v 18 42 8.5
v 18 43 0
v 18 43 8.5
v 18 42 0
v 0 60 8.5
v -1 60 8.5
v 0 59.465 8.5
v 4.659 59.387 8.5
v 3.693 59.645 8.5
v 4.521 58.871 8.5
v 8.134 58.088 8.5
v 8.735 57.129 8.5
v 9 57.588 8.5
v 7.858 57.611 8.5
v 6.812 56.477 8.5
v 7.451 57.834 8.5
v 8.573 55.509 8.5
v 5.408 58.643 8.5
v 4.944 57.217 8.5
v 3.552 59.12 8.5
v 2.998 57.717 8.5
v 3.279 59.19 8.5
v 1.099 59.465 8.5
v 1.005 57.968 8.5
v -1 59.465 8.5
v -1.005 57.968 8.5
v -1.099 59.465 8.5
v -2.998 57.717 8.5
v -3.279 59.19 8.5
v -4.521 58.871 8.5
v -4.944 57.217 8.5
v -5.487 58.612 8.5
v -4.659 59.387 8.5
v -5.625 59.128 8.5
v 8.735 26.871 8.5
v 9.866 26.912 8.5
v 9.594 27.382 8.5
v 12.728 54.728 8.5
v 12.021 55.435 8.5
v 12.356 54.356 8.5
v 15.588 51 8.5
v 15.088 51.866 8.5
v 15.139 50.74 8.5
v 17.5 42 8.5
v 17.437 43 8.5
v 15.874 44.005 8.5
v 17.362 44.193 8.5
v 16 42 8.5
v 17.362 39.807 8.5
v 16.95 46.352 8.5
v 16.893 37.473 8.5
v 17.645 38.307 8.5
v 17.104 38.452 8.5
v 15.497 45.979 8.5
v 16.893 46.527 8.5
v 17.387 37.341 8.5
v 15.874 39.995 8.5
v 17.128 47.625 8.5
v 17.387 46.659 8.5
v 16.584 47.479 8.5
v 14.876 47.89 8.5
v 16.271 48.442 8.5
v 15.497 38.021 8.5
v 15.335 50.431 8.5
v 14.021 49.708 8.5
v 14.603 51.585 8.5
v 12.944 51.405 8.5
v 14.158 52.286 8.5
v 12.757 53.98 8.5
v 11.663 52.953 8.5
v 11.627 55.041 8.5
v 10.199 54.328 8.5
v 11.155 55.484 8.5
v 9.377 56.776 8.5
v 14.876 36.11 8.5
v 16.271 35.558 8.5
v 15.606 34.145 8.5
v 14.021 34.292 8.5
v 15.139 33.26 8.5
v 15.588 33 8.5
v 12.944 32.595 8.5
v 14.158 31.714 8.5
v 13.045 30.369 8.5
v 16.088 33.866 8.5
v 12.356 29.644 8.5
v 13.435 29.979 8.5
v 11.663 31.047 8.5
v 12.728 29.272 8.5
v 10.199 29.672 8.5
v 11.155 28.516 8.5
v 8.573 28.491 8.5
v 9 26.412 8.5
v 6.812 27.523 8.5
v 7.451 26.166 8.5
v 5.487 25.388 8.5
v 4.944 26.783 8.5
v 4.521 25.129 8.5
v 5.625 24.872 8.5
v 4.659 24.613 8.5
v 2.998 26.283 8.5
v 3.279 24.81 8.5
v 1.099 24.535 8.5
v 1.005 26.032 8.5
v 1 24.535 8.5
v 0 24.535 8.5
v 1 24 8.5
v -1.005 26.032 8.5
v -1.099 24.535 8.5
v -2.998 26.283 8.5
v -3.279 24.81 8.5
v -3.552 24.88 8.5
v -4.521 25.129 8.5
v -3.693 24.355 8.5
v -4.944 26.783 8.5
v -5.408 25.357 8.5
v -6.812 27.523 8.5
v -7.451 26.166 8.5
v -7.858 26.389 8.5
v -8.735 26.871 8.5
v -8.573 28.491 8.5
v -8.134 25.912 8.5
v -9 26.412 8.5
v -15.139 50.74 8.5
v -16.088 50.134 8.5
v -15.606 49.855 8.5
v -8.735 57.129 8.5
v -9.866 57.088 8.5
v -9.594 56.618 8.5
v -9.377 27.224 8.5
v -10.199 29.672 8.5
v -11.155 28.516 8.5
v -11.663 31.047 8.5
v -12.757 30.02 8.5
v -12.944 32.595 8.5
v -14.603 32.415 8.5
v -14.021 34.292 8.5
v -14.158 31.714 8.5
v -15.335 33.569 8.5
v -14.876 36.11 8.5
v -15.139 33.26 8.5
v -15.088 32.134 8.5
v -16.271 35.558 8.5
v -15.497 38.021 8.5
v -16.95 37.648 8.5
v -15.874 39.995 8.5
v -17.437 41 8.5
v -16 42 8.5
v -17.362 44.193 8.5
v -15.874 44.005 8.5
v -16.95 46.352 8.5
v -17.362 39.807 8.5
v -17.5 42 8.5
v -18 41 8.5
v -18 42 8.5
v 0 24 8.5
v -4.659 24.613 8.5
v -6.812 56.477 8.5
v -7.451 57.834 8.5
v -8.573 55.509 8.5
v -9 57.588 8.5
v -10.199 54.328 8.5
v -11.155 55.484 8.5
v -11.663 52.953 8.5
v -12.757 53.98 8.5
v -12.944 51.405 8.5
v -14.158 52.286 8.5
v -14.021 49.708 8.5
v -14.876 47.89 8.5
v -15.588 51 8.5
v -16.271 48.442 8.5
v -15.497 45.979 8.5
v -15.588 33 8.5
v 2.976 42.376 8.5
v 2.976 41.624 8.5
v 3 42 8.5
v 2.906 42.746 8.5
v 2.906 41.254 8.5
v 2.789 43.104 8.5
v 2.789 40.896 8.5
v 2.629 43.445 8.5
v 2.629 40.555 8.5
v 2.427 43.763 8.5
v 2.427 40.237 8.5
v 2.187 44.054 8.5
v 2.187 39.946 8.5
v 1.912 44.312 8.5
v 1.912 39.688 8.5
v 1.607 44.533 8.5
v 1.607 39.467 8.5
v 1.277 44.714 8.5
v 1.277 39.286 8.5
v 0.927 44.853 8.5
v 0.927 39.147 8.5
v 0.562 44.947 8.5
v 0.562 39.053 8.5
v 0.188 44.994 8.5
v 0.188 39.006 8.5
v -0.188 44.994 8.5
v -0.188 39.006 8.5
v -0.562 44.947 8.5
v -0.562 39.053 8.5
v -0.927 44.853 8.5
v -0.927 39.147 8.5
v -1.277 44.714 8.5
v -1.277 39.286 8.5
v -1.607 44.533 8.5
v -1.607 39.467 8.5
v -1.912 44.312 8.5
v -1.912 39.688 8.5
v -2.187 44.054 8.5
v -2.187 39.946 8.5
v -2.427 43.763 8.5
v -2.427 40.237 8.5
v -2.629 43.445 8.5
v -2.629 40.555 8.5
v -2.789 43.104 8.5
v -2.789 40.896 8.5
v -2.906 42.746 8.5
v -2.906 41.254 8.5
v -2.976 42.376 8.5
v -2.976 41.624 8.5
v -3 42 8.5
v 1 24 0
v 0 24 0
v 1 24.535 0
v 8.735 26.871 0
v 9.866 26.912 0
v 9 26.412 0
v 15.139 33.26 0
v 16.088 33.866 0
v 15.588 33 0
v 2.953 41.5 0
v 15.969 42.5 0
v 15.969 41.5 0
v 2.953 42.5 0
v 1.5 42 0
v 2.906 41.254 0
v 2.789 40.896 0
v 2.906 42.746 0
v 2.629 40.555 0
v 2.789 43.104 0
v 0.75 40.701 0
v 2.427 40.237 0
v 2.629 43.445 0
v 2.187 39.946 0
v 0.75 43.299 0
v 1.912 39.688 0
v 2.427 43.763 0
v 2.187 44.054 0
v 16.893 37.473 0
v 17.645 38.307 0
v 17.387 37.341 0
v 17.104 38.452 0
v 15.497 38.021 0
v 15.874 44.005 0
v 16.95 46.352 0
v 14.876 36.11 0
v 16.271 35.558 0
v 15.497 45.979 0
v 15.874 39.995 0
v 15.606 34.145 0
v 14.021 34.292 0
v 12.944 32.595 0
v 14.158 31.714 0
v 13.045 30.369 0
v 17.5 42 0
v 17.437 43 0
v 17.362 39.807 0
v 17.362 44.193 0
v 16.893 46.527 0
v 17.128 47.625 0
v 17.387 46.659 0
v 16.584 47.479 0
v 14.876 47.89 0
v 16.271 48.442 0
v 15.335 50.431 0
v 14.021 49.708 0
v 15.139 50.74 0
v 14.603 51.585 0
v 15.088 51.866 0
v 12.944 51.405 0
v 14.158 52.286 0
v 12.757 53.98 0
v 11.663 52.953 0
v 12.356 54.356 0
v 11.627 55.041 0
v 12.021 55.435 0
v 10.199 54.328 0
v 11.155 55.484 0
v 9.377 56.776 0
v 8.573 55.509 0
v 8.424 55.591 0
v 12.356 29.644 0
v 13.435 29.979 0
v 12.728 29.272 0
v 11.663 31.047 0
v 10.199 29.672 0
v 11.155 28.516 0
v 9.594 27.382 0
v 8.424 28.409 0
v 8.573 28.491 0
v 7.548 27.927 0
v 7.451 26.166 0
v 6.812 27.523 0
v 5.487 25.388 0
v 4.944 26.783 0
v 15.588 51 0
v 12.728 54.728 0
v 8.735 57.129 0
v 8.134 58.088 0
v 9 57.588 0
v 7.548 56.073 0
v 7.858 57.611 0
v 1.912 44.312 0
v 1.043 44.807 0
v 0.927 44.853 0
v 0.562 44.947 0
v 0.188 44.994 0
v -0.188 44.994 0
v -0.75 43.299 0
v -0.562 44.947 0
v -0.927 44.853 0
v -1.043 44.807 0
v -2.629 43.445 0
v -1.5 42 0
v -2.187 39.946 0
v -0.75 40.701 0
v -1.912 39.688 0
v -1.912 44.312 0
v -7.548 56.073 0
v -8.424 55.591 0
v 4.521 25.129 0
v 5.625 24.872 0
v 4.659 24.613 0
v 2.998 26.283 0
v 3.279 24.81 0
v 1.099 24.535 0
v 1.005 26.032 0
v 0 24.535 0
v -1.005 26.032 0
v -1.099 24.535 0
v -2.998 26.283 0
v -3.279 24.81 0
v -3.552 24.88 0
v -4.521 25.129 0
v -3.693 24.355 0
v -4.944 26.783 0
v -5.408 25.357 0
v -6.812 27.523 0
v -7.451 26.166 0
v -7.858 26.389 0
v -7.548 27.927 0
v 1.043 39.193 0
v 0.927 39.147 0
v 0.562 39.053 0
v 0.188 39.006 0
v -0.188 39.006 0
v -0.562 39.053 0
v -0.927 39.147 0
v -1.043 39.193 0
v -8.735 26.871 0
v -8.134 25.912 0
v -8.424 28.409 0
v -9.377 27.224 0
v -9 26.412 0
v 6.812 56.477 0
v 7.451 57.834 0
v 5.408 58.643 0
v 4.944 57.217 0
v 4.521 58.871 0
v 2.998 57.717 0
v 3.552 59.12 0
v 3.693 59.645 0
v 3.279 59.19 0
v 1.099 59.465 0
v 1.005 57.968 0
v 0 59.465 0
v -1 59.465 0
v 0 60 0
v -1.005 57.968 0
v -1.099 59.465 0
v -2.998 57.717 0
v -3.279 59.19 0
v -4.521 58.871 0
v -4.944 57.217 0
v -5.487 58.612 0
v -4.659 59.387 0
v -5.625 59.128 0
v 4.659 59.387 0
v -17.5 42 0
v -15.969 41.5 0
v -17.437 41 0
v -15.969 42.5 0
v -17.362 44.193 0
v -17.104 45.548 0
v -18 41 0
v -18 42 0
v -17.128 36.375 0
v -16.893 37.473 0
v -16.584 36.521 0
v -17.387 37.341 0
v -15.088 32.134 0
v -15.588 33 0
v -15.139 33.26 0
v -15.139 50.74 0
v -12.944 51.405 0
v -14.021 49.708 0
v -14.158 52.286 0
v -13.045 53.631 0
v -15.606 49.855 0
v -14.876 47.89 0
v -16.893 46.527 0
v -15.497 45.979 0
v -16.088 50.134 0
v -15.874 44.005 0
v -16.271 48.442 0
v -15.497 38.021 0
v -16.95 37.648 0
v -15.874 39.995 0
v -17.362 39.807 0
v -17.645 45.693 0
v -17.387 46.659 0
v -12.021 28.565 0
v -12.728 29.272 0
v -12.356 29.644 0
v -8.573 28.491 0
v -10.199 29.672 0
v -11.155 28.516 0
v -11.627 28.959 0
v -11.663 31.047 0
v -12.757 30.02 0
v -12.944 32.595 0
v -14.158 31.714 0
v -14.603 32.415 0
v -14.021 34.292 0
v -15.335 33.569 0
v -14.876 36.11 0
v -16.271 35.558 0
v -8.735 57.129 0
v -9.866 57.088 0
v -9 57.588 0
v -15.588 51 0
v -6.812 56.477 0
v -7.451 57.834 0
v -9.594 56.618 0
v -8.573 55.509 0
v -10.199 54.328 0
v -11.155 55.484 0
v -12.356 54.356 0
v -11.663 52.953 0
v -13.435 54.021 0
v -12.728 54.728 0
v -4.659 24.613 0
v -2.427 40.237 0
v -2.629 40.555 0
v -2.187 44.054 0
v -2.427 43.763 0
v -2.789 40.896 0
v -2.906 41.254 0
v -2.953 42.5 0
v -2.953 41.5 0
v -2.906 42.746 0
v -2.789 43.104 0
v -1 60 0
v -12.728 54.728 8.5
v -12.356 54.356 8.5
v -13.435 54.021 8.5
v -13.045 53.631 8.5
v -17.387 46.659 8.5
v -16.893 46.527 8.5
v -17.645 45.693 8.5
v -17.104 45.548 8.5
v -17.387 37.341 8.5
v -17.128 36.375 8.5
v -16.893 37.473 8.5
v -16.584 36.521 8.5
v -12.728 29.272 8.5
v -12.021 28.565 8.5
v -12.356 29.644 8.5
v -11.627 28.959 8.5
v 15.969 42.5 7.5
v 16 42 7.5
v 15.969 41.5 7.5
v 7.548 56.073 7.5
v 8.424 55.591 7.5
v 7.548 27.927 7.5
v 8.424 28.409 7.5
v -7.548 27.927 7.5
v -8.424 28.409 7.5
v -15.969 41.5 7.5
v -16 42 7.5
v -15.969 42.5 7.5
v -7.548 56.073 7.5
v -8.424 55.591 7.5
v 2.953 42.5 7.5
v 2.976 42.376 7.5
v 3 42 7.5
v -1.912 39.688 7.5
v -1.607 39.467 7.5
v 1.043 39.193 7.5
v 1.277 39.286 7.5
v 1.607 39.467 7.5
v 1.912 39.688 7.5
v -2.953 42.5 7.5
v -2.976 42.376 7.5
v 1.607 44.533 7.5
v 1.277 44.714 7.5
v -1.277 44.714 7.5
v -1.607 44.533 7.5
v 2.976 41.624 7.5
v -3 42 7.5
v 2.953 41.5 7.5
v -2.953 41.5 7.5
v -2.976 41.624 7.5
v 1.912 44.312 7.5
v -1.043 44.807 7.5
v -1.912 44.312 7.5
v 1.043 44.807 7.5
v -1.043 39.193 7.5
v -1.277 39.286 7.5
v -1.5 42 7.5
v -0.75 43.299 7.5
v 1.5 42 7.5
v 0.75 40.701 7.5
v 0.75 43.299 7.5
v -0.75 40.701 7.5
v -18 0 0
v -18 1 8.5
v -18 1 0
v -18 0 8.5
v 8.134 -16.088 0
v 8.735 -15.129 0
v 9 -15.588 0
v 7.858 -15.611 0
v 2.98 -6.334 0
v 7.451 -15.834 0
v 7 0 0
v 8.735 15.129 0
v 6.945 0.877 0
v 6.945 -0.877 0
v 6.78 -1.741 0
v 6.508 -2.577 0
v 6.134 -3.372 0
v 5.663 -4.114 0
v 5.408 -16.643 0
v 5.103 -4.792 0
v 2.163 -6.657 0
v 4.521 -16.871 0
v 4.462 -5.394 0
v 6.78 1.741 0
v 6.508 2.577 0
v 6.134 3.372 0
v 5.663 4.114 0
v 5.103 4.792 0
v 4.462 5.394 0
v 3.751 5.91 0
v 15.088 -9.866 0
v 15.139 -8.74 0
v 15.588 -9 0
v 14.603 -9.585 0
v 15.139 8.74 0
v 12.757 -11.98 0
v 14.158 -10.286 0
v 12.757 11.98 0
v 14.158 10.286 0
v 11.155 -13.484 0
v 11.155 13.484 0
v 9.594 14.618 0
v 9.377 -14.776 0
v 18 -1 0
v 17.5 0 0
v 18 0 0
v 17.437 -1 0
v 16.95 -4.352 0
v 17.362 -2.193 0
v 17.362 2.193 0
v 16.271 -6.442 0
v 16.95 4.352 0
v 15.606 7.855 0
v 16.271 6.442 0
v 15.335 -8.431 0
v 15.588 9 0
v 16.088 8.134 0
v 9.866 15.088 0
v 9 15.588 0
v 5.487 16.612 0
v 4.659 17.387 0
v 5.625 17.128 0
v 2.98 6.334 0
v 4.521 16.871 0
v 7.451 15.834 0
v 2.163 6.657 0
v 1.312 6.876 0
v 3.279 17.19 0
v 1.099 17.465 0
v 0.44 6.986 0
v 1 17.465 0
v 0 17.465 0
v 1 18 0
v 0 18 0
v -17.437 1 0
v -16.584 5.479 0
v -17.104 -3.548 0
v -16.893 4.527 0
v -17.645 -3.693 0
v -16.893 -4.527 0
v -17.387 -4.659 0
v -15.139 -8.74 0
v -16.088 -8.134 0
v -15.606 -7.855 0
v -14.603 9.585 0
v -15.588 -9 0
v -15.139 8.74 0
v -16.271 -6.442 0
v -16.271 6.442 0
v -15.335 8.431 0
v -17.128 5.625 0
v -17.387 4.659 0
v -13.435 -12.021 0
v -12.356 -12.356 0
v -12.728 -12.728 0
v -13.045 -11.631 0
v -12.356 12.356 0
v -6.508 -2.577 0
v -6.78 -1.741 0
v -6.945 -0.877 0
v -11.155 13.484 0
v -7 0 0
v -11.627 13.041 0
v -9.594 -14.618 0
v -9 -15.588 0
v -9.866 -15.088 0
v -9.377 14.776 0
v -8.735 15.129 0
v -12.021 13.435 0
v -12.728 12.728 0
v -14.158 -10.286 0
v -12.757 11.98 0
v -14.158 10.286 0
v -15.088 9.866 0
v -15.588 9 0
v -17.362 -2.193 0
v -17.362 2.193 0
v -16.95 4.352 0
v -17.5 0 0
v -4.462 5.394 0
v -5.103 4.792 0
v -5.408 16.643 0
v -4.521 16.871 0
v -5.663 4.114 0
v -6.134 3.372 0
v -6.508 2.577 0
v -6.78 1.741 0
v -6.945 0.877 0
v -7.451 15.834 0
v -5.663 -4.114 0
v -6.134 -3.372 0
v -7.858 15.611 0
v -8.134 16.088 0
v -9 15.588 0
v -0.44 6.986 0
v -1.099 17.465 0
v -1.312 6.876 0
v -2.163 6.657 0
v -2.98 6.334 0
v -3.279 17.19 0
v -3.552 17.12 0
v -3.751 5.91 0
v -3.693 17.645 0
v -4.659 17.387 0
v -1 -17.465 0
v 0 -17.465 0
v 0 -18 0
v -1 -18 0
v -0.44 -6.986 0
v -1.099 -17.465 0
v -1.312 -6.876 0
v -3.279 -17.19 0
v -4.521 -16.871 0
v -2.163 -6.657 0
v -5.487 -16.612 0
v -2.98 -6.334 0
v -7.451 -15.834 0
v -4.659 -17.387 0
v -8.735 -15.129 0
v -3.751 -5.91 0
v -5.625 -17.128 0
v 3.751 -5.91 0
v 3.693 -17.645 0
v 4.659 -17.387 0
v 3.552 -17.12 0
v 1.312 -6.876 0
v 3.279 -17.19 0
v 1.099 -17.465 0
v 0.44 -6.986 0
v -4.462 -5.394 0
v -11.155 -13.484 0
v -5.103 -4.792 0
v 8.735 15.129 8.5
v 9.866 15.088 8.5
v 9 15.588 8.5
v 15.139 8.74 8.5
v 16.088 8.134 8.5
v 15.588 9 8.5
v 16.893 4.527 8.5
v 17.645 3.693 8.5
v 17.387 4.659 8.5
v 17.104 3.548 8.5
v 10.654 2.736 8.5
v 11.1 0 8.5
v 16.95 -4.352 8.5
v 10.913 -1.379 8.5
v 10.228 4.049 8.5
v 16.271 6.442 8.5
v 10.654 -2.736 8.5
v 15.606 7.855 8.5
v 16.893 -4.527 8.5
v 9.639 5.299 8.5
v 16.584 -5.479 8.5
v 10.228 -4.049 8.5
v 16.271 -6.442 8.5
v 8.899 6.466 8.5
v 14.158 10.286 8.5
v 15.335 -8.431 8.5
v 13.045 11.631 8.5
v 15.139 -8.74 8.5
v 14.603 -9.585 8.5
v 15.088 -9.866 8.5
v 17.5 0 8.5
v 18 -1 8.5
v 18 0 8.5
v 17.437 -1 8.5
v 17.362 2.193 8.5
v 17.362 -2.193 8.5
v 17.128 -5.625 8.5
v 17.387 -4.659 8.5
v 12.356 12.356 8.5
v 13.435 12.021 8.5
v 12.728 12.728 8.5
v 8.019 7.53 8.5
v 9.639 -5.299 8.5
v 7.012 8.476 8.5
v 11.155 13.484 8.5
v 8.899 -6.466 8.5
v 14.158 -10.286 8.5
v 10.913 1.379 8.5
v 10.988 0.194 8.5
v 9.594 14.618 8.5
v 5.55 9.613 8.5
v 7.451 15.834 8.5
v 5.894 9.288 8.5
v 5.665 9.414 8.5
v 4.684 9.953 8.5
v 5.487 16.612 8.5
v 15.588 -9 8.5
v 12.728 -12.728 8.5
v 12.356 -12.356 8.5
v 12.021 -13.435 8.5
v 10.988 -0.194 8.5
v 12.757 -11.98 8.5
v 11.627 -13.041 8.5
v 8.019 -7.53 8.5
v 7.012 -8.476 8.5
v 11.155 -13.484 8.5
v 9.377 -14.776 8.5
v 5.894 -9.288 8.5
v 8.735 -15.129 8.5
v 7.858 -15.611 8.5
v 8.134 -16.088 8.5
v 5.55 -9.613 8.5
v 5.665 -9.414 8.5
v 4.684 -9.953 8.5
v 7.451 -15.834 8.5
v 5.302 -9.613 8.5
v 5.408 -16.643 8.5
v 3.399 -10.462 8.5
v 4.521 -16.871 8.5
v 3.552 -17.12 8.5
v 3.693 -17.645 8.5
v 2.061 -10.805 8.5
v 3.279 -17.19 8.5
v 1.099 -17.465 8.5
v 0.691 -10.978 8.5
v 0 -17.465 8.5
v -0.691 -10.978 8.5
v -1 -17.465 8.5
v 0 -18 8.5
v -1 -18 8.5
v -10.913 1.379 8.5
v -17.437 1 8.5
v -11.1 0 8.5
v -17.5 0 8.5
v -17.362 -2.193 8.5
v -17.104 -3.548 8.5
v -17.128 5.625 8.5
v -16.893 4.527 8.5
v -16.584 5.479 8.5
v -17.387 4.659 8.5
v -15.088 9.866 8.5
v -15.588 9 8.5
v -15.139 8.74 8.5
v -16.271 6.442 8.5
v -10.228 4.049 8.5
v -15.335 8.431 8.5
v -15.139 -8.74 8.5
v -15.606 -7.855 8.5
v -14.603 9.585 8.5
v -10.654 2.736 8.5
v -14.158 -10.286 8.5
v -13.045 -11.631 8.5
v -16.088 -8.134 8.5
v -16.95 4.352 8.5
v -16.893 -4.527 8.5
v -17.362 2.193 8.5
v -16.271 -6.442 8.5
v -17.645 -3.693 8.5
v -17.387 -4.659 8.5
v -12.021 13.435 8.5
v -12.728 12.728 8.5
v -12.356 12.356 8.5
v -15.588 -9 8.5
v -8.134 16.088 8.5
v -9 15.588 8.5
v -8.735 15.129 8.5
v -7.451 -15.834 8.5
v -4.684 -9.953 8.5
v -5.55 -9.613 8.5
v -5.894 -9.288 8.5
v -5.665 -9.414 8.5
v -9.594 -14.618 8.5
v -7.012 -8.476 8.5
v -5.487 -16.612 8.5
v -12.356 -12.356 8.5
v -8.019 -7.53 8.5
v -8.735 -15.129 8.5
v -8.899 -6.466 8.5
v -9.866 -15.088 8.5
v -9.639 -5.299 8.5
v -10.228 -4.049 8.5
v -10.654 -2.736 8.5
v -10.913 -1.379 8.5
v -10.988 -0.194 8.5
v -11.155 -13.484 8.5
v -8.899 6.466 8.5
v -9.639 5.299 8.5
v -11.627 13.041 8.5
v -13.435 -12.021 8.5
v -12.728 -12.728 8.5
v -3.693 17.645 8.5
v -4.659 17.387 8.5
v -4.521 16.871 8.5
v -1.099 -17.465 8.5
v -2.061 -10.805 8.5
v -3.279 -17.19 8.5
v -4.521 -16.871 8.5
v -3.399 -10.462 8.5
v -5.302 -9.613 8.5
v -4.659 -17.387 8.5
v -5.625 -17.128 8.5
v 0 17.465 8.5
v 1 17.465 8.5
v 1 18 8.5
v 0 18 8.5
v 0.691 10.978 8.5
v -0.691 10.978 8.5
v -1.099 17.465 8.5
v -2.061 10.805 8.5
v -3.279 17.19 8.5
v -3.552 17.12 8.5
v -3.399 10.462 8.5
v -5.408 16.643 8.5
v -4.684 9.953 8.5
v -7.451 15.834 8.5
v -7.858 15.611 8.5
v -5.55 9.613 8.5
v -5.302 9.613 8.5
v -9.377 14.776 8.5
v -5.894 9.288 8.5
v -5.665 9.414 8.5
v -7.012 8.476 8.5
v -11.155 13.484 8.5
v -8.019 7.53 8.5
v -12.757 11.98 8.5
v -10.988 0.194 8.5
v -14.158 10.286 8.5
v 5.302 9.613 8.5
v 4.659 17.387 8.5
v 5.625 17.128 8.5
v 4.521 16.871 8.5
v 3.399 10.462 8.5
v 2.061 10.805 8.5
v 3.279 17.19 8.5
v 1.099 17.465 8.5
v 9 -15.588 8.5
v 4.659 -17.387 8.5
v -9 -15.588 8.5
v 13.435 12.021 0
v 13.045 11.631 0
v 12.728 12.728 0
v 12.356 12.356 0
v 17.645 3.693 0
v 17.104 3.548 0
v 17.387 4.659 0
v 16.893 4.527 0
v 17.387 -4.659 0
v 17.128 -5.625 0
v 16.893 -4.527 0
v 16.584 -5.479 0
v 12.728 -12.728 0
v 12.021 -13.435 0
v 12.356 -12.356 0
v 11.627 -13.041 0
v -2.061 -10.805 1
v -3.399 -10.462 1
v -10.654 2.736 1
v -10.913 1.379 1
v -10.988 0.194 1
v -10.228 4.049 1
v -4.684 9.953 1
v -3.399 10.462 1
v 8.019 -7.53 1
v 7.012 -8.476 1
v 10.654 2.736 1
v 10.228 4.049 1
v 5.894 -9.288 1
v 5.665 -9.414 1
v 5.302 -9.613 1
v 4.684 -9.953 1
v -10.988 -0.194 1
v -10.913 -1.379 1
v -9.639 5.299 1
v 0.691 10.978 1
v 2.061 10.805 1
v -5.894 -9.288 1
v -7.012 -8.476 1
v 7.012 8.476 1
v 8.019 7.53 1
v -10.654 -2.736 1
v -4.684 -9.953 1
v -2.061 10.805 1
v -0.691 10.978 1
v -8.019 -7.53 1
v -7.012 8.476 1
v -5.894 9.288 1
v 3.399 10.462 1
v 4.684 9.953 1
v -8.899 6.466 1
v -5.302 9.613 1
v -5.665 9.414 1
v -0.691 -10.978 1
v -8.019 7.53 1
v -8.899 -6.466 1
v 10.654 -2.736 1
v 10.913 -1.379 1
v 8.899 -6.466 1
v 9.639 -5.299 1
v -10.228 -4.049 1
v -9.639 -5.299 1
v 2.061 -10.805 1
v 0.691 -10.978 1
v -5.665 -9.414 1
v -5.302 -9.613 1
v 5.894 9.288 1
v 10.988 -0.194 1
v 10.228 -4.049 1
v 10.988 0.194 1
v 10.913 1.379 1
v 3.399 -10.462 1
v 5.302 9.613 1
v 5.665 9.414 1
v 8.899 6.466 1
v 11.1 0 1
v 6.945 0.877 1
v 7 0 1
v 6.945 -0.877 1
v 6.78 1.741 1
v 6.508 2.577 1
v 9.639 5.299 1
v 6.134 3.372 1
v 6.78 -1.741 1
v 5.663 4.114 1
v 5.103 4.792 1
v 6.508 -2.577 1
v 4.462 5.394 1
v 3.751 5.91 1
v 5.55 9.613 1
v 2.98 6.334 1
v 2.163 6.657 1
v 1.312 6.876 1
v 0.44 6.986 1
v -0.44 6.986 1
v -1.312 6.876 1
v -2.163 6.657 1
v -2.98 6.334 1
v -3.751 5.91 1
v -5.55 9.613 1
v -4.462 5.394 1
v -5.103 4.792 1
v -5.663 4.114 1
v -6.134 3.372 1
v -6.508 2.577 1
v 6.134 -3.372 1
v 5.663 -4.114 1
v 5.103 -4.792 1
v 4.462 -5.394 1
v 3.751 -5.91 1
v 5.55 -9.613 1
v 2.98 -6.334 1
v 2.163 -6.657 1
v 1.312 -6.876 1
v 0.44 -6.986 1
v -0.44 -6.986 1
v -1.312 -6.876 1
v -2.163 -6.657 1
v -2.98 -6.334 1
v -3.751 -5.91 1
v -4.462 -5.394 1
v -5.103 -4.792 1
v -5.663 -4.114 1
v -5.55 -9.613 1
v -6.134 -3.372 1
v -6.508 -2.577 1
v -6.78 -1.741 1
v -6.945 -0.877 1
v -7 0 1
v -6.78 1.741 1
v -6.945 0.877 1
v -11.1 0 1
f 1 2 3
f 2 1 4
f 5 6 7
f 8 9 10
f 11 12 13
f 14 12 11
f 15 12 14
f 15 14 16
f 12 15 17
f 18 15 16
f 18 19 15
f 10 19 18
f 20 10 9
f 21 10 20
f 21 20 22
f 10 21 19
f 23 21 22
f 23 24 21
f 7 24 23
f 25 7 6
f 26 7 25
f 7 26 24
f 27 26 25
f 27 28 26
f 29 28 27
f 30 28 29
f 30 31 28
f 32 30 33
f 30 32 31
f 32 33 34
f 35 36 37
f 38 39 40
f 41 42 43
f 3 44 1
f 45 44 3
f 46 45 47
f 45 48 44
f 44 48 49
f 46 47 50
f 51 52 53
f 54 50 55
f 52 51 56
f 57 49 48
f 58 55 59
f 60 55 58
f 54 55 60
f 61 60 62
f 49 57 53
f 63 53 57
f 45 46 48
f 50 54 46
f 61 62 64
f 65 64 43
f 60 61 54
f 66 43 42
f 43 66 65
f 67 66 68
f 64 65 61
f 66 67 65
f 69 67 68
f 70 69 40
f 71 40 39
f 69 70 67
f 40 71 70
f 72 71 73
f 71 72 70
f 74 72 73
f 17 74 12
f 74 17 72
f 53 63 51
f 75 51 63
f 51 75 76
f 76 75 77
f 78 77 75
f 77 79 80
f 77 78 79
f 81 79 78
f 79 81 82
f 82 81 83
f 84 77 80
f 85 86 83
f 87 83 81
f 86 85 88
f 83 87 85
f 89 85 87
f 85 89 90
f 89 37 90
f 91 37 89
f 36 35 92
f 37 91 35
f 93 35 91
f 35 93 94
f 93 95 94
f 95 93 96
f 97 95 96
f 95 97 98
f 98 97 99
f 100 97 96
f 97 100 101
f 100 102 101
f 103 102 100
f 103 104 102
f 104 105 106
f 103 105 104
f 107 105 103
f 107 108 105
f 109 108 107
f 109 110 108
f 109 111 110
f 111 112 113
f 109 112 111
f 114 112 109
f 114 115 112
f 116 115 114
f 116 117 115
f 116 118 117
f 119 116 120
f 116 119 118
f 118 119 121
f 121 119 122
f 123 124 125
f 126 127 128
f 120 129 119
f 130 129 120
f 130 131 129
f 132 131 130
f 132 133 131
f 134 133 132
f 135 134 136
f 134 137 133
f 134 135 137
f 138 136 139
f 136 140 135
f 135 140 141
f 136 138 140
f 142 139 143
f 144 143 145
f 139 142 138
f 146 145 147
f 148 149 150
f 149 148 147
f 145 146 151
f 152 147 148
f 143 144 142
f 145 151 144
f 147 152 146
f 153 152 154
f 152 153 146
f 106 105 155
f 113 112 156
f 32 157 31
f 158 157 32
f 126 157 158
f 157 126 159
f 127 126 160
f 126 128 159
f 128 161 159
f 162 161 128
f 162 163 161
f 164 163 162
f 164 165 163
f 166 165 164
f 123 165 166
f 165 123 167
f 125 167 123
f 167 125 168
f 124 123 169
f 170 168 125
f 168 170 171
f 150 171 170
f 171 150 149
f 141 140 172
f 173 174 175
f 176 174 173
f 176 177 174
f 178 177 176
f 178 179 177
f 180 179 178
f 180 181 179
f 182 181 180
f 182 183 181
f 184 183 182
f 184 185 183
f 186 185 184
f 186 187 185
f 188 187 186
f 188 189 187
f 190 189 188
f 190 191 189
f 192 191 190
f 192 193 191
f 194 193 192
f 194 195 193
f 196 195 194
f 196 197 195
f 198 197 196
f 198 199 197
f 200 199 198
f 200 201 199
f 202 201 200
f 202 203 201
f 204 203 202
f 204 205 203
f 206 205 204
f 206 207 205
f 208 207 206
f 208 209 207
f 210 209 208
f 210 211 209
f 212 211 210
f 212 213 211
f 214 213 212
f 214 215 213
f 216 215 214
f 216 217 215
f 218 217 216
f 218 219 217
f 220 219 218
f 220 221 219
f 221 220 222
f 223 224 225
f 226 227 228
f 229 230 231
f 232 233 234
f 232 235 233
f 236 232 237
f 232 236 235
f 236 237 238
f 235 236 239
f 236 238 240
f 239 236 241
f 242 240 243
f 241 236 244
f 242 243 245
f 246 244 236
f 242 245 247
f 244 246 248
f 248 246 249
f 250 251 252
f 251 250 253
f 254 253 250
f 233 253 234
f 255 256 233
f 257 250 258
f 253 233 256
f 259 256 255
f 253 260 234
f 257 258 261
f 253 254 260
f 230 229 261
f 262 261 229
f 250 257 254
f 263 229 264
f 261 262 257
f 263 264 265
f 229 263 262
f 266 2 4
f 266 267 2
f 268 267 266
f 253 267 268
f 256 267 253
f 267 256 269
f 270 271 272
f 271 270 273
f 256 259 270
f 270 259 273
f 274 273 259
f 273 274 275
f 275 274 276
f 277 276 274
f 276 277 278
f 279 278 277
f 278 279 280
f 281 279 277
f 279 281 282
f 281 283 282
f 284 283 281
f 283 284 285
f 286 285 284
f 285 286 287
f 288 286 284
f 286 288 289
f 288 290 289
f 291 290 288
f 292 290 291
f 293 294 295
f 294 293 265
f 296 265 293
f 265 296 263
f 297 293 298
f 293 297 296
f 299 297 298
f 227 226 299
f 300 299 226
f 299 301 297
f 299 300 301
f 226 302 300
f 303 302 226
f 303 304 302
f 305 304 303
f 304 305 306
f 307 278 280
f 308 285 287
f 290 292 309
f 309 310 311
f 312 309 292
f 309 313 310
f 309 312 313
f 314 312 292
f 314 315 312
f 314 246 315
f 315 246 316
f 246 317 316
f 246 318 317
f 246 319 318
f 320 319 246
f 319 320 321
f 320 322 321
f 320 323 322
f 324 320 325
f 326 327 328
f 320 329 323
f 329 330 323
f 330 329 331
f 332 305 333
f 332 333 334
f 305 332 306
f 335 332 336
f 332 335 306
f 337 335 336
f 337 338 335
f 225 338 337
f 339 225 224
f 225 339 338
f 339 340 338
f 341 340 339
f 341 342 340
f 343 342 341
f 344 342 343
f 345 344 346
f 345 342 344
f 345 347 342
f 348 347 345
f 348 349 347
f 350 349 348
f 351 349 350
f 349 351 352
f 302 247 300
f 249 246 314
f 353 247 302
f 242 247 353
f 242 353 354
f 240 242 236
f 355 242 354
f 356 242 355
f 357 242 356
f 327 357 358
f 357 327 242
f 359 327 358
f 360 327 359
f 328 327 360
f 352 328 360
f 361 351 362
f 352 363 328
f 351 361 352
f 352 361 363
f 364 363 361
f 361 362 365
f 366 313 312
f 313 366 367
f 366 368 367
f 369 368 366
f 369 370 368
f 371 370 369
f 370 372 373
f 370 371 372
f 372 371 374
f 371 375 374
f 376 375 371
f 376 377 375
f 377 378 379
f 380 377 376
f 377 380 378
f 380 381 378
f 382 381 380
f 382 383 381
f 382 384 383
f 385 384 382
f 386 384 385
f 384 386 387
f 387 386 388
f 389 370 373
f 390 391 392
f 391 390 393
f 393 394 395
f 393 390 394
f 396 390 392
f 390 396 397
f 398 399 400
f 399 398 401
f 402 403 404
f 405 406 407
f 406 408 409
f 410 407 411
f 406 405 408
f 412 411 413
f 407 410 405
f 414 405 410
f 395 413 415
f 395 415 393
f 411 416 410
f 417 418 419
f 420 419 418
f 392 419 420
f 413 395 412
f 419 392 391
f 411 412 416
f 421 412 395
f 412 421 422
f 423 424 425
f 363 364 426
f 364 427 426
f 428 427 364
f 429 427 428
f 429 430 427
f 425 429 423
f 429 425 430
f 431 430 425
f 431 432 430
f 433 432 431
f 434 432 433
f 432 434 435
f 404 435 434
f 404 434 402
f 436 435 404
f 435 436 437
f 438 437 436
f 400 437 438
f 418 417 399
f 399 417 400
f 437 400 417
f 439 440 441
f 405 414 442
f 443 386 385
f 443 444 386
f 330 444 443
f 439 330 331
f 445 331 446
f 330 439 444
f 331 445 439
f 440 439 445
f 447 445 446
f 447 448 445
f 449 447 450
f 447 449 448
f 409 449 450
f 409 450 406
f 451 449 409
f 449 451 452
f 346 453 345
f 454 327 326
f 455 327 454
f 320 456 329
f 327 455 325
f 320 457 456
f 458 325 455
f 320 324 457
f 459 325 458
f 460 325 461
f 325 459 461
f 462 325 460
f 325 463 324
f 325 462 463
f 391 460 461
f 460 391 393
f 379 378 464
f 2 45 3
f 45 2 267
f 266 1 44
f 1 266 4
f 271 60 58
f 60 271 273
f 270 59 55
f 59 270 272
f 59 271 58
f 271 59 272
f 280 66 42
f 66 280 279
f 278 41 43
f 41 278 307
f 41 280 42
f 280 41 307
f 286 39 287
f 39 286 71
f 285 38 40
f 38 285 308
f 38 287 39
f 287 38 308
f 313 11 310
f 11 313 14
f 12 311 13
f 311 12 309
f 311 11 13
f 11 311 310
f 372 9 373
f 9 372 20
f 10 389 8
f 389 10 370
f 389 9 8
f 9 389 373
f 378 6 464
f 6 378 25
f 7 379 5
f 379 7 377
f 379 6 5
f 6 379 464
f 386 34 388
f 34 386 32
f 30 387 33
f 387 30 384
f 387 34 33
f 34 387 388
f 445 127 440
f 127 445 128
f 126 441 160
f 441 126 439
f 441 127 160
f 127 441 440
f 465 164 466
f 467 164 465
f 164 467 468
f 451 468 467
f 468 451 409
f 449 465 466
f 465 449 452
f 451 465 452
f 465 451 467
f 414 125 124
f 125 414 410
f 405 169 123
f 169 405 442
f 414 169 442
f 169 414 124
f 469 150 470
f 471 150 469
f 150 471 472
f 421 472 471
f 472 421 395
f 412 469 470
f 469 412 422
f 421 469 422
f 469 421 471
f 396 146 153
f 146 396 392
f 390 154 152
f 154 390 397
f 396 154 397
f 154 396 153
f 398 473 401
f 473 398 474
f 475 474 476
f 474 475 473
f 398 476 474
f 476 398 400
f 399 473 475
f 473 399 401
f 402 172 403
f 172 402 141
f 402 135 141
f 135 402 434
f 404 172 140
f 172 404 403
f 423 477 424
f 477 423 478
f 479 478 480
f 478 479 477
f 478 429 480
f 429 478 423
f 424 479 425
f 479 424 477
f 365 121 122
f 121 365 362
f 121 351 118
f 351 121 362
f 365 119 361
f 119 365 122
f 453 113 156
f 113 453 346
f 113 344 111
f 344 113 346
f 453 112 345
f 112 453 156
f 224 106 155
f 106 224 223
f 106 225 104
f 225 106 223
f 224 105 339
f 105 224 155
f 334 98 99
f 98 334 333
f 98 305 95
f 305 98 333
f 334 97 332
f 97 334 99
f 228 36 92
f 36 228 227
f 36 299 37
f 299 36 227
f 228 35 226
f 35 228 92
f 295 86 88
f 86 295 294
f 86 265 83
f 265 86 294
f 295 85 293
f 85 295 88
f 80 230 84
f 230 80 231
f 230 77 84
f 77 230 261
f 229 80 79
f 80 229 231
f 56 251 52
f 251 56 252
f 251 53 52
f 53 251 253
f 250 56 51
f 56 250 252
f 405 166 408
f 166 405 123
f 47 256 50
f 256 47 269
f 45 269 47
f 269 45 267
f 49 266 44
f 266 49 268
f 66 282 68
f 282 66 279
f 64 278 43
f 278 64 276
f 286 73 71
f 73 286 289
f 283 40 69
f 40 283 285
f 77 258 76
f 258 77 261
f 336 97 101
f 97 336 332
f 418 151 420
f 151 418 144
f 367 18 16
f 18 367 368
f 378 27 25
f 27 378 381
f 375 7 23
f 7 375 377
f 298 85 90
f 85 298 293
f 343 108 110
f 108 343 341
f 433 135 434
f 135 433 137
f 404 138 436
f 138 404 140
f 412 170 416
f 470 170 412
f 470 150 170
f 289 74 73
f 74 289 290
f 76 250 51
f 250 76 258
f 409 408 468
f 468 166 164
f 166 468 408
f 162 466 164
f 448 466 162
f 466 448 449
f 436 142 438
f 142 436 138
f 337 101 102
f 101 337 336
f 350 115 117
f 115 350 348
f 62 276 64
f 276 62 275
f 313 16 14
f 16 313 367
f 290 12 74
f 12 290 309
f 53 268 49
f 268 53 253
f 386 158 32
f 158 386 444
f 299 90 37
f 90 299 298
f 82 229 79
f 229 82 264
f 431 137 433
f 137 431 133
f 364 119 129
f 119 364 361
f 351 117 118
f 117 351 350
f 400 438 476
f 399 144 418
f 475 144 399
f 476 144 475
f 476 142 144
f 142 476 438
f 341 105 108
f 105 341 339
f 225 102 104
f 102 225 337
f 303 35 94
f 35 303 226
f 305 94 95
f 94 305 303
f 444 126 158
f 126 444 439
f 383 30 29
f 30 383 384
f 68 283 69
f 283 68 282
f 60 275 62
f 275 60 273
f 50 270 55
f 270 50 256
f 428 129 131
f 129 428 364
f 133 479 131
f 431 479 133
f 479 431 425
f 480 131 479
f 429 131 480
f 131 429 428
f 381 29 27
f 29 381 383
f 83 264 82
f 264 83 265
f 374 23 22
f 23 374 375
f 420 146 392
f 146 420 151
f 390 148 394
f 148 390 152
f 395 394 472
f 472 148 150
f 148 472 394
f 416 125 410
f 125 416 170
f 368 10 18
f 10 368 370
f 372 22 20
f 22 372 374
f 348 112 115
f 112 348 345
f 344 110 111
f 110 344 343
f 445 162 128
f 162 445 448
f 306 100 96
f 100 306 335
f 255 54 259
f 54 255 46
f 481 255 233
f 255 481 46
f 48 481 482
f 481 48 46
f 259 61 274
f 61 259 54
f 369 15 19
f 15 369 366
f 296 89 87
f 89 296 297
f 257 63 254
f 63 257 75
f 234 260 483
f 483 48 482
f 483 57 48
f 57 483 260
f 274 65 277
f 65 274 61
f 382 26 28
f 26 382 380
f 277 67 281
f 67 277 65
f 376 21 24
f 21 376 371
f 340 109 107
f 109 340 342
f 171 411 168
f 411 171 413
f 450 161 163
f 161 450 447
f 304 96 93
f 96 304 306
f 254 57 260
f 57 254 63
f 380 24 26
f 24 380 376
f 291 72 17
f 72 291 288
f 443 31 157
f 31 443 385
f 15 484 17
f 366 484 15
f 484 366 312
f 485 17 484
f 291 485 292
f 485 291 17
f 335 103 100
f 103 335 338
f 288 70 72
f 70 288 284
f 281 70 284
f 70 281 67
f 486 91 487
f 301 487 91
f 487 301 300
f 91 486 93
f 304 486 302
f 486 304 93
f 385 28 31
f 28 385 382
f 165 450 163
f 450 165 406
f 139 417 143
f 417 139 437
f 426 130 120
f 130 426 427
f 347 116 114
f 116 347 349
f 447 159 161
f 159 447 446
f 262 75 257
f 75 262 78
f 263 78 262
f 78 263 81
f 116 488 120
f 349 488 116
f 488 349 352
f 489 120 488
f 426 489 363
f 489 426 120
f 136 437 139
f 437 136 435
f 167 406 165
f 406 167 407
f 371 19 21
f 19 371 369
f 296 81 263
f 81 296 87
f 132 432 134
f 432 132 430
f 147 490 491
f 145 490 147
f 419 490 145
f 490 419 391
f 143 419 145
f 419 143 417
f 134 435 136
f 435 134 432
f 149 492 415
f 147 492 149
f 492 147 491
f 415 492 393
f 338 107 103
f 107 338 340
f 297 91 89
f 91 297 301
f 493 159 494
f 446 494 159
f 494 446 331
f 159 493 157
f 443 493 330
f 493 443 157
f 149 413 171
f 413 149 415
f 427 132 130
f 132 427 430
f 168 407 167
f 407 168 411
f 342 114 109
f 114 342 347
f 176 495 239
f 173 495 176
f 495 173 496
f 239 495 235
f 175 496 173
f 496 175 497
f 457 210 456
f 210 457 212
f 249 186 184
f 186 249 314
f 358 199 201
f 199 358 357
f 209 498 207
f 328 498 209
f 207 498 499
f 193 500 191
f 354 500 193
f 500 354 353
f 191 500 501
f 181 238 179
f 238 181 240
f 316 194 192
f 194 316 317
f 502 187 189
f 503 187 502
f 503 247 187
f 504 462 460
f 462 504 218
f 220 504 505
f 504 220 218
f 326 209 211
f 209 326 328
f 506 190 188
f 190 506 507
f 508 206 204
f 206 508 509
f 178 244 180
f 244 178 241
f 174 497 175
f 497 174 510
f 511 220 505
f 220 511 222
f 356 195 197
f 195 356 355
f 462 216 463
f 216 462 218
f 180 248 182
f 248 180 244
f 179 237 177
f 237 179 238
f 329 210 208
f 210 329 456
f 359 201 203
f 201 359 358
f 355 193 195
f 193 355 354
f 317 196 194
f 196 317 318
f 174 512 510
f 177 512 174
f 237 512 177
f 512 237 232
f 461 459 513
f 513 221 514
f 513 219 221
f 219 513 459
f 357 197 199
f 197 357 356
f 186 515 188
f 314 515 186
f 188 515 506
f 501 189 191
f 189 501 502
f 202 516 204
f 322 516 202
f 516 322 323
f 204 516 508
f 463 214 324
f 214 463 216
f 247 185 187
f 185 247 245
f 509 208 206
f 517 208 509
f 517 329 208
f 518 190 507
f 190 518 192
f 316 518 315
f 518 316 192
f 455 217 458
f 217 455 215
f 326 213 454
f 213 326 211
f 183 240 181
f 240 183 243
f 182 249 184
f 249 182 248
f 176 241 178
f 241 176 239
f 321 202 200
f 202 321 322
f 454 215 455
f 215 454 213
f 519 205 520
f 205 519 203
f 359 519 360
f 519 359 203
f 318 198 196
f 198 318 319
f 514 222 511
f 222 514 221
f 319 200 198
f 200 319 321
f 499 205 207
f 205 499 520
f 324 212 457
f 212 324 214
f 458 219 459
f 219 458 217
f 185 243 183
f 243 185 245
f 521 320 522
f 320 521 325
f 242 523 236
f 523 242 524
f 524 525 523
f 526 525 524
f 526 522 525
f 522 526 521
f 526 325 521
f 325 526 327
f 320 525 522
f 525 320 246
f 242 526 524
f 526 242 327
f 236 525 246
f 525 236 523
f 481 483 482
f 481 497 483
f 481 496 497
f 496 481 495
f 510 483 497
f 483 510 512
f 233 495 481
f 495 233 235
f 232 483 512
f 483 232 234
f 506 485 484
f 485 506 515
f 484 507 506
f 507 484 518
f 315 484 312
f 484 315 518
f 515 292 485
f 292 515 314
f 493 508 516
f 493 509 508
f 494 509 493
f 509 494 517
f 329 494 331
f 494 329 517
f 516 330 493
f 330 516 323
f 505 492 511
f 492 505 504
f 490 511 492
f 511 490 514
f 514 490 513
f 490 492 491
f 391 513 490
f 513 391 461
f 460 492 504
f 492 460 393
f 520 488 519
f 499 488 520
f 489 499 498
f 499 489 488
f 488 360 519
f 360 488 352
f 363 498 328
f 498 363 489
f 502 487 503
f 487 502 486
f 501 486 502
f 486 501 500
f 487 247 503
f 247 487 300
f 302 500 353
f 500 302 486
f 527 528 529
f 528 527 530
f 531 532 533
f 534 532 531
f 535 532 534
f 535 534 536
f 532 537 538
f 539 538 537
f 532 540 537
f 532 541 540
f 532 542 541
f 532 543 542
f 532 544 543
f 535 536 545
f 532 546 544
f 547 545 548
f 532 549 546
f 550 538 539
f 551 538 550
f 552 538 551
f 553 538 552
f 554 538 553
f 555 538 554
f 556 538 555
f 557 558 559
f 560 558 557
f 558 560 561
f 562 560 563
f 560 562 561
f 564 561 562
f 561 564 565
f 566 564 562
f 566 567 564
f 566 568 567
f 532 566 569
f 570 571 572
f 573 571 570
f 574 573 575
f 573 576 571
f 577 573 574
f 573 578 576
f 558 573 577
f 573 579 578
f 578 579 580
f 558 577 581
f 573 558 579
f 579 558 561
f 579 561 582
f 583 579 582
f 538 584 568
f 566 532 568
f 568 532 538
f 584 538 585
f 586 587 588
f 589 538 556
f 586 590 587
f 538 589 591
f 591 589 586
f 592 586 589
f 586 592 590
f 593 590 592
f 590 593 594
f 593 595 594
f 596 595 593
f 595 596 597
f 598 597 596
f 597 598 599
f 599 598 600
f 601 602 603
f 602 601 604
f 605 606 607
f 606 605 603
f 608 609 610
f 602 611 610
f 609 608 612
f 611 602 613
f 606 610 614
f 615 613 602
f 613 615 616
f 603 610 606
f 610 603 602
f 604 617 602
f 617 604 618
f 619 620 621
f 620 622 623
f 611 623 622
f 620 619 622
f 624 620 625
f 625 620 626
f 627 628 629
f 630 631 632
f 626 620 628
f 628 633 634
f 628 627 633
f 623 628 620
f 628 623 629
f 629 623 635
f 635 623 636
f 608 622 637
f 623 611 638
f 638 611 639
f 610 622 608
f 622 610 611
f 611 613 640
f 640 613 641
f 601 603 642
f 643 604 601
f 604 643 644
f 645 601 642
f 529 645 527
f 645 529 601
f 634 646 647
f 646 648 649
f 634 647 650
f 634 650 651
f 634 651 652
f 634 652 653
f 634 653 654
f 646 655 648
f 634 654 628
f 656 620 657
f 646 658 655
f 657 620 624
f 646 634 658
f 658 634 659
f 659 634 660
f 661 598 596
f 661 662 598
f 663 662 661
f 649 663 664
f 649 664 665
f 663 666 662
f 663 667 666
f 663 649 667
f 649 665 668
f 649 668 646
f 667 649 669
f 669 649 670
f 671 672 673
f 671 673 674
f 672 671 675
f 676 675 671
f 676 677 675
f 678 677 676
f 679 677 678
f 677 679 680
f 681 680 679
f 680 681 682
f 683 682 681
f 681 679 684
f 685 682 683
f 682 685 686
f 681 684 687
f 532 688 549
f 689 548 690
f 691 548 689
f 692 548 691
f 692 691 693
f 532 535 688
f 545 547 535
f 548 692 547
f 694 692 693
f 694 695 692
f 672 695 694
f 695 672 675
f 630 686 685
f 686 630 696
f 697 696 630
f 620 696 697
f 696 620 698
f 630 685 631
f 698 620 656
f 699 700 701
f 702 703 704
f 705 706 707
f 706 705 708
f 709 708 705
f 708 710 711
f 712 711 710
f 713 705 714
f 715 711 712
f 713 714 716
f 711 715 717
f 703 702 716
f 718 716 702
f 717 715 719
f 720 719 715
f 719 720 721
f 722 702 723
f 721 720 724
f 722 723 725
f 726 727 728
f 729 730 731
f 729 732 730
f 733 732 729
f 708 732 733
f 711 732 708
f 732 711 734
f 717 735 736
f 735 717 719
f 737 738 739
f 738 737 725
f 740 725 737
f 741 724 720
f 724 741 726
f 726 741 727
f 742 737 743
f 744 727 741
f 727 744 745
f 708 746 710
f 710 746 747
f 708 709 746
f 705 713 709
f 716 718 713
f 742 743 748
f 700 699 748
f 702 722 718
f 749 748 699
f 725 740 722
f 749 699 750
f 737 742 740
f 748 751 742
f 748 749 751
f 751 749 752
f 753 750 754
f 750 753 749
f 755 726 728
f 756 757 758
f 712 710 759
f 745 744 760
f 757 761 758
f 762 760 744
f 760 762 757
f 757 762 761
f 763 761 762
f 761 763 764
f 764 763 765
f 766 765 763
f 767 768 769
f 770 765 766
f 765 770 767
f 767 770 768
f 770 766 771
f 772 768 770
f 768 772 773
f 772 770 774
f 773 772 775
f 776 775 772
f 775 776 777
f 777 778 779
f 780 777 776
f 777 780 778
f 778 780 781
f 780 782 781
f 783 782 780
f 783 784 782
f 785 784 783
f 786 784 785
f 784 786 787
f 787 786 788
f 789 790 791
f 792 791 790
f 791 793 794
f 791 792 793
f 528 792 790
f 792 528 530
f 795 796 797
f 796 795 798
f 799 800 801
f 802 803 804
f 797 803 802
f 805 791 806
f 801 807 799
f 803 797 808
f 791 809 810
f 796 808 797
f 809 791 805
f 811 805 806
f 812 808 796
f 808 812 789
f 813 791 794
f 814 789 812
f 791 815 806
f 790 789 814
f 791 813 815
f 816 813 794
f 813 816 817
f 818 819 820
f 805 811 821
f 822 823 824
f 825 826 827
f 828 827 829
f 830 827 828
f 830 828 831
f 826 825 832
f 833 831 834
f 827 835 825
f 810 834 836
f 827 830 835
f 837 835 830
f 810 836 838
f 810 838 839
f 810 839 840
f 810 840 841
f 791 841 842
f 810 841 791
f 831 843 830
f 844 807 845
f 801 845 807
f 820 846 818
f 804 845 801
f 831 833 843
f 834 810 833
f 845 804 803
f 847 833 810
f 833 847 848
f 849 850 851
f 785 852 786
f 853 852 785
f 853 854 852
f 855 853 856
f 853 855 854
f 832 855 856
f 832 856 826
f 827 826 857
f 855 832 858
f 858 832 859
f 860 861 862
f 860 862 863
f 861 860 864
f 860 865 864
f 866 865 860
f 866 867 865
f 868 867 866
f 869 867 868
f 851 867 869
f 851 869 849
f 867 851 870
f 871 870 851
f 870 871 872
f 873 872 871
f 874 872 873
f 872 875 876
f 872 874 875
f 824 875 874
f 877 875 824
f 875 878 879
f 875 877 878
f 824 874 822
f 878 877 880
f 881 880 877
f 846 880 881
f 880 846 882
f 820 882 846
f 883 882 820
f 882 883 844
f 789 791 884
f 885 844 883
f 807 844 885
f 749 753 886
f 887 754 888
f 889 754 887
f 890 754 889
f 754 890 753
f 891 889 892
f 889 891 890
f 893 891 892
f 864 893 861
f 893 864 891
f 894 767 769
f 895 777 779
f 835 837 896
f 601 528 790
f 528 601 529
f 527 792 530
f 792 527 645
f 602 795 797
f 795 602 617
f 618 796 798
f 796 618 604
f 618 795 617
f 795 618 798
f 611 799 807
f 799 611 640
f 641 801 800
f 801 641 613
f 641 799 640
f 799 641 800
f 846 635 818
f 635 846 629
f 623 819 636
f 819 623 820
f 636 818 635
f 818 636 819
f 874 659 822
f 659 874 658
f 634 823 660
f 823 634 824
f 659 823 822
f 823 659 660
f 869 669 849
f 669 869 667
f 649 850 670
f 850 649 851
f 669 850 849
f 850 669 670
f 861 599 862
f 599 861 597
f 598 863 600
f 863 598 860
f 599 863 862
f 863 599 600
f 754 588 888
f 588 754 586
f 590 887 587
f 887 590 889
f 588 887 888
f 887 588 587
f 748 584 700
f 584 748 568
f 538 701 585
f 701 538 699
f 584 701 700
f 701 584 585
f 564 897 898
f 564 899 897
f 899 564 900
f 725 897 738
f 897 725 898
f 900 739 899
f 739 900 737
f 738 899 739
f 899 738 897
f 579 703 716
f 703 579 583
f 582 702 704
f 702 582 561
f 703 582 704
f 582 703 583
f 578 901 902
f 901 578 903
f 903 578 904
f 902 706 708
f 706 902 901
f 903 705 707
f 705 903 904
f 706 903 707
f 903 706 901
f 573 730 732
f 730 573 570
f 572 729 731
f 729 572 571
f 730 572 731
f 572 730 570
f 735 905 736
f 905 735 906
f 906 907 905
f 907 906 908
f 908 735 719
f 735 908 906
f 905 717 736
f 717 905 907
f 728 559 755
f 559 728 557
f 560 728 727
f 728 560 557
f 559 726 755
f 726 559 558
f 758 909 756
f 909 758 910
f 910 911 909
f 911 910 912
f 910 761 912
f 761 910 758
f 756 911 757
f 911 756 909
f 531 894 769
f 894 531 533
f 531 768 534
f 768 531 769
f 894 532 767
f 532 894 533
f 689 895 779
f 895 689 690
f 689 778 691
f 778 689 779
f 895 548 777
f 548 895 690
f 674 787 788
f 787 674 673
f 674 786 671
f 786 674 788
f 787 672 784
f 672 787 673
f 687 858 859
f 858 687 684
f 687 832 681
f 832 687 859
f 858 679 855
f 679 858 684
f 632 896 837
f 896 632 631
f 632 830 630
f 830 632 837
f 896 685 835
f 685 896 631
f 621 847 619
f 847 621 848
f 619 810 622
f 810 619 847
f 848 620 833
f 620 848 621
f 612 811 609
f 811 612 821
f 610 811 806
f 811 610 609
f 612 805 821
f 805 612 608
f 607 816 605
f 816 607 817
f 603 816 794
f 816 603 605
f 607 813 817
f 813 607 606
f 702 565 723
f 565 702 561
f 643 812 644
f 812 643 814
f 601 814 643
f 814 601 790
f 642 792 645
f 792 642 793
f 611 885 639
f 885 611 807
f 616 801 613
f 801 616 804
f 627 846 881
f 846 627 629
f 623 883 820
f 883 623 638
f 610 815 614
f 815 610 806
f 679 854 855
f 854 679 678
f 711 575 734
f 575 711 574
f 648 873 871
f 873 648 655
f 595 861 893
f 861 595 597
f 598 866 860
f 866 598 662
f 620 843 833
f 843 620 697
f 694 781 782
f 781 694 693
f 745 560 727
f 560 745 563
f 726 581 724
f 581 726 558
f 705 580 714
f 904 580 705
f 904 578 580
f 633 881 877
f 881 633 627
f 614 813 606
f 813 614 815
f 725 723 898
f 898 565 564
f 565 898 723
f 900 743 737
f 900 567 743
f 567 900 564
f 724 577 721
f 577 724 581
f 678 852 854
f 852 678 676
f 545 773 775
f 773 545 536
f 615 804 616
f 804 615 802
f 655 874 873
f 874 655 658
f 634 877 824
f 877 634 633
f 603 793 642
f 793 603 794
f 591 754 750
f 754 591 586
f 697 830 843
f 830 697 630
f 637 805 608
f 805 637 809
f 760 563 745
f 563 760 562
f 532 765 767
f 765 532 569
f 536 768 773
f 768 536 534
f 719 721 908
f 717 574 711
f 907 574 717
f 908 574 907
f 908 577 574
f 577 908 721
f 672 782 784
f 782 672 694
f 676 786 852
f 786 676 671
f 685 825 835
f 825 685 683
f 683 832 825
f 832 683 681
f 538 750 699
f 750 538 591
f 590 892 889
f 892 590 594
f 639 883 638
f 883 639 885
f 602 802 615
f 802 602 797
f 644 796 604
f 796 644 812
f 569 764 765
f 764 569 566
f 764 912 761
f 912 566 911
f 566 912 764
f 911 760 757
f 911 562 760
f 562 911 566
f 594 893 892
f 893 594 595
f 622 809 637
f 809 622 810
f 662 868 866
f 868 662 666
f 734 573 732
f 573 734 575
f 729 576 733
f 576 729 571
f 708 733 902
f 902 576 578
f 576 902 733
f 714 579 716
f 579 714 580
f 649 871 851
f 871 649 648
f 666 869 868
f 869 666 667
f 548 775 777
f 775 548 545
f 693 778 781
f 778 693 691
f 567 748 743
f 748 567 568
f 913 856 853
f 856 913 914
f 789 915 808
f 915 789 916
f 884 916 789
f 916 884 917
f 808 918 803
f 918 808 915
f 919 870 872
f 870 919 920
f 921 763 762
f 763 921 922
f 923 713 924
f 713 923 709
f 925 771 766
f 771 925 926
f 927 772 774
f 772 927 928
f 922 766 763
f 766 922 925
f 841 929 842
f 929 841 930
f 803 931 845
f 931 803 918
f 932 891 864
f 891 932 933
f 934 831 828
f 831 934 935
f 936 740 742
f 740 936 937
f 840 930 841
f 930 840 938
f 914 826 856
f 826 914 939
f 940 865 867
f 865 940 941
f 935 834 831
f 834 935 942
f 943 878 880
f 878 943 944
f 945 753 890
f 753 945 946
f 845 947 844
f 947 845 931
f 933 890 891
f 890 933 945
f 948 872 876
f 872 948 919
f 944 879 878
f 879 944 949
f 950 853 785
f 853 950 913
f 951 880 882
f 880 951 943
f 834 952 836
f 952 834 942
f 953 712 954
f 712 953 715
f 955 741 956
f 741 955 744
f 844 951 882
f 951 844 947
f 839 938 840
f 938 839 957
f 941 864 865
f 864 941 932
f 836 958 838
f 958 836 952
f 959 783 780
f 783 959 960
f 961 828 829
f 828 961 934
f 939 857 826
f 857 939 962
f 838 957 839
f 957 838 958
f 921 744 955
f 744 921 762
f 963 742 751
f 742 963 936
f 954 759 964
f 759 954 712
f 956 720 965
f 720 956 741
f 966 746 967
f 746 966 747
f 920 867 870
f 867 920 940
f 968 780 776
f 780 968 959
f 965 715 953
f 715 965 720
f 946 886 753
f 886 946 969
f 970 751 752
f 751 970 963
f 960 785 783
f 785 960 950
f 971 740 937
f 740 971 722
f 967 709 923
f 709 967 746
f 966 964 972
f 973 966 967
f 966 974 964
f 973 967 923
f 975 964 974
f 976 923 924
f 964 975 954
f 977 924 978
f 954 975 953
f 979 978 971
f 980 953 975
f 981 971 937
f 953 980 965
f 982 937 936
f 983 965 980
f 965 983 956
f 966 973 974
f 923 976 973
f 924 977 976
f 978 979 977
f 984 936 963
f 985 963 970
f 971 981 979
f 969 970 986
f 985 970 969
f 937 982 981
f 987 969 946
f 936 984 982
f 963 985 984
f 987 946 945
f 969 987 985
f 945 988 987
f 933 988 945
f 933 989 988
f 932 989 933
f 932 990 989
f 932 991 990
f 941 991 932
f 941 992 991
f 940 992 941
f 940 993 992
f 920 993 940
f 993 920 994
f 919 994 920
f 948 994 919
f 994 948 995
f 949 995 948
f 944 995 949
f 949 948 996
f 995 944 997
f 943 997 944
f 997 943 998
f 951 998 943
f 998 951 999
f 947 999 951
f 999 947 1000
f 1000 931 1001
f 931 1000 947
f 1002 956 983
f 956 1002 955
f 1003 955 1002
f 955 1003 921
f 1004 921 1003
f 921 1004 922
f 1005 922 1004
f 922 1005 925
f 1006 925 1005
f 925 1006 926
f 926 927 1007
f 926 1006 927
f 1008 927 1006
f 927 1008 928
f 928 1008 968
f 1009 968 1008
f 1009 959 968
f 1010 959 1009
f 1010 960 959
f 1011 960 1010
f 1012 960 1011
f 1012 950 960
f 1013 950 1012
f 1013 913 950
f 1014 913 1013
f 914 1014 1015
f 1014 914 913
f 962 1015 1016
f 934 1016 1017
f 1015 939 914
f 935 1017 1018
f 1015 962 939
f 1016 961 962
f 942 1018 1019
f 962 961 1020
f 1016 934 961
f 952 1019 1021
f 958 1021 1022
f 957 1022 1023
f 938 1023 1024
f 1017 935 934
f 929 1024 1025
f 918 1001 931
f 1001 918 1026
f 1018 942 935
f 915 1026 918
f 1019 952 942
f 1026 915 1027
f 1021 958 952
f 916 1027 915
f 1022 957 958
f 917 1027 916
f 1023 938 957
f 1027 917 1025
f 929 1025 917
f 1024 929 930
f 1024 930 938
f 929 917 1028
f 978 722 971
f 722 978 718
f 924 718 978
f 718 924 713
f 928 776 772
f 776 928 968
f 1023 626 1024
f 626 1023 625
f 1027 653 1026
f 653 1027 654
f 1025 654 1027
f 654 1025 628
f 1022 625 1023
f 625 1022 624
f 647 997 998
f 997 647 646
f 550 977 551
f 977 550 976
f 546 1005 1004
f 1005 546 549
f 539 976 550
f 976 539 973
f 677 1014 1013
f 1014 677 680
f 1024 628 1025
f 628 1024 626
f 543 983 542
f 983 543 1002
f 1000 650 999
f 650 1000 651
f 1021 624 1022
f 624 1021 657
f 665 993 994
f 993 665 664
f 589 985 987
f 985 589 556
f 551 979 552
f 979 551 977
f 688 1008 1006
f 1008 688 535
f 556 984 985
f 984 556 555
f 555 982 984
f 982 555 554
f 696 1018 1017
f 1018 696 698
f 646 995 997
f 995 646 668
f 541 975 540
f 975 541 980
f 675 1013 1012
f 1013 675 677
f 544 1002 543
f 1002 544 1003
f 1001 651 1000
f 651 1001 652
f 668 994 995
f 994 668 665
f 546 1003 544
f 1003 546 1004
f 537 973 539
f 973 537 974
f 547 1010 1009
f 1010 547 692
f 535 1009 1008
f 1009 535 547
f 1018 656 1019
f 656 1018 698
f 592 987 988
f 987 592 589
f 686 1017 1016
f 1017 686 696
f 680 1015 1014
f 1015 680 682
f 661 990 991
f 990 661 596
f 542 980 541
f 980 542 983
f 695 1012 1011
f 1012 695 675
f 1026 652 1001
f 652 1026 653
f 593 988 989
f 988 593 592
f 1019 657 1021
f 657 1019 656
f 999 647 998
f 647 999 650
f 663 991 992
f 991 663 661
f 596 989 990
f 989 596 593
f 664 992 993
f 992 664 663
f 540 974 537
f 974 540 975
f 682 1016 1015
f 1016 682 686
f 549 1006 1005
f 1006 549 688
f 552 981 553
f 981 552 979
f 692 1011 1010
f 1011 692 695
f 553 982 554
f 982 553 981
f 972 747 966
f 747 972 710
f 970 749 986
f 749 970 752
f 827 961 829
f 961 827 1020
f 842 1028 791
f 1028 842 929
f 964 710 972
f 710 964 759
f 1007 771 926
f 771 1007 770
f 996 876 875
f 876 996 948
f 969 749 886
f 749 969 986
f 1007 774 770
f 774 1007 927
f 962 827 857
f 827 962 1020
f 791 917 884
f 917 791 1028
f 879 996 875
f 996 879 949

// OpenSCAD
// file: regular_polygon.scad
module regular_polygon(order = 4, r=1){
     angles=[ for (i = [0:order-1]) i*(360/order) ];
     coords=[ for (th=angles) [r*cos(th), r*sin(th)] ];
     polygon(coords);
}
// main file
use <regular_polygon.scad>;
od=32;
bearing_od=22;
id=8;
hh=7.5;
$fn=50;

module bearing_wheel(){
translate([0,0,hh+1])rotate([0,180,0])difference(){
  union(){
    cylinder(d=od+3, h=hh+1);
    for(i = [0:15:360])
    rotate(i)translate([od/2,0,0])cube([2,1,hh+1]);
}
  translate([0,0,0])union(){
    cylinder(d=bearing_od, h=hh);
    cylinder(d=bearing_od-8, h=hh+1);
    linear_extrude(height=hh)regular_polygon(order=6, r=11.1);
  }
}
}

module drive_wheel(){
  difference(){
  union(){
    cylinder(d=od+3, h=hh+1);
    for(i = [0:15:360])
    rotate(i)translate([od/2,0,0])cube([2,1,hh+1]);
}
  union(){
    difference(){cylinder(d=od, h=hh+1);cylinder(d=6, h=hh+1);}
    linear_extrude(height=hh)regular_polygon(order=6, r=3/2);
  }
  }
  for(i=[0:60:360])
  rotate(i)translate([2,-0.5,0])cube([od/2-1,1,hh]);
}

color([1,0,0])translate([0,od+10,0])drive_wheel();
color([0,1,0])bearing_wheel(); 
